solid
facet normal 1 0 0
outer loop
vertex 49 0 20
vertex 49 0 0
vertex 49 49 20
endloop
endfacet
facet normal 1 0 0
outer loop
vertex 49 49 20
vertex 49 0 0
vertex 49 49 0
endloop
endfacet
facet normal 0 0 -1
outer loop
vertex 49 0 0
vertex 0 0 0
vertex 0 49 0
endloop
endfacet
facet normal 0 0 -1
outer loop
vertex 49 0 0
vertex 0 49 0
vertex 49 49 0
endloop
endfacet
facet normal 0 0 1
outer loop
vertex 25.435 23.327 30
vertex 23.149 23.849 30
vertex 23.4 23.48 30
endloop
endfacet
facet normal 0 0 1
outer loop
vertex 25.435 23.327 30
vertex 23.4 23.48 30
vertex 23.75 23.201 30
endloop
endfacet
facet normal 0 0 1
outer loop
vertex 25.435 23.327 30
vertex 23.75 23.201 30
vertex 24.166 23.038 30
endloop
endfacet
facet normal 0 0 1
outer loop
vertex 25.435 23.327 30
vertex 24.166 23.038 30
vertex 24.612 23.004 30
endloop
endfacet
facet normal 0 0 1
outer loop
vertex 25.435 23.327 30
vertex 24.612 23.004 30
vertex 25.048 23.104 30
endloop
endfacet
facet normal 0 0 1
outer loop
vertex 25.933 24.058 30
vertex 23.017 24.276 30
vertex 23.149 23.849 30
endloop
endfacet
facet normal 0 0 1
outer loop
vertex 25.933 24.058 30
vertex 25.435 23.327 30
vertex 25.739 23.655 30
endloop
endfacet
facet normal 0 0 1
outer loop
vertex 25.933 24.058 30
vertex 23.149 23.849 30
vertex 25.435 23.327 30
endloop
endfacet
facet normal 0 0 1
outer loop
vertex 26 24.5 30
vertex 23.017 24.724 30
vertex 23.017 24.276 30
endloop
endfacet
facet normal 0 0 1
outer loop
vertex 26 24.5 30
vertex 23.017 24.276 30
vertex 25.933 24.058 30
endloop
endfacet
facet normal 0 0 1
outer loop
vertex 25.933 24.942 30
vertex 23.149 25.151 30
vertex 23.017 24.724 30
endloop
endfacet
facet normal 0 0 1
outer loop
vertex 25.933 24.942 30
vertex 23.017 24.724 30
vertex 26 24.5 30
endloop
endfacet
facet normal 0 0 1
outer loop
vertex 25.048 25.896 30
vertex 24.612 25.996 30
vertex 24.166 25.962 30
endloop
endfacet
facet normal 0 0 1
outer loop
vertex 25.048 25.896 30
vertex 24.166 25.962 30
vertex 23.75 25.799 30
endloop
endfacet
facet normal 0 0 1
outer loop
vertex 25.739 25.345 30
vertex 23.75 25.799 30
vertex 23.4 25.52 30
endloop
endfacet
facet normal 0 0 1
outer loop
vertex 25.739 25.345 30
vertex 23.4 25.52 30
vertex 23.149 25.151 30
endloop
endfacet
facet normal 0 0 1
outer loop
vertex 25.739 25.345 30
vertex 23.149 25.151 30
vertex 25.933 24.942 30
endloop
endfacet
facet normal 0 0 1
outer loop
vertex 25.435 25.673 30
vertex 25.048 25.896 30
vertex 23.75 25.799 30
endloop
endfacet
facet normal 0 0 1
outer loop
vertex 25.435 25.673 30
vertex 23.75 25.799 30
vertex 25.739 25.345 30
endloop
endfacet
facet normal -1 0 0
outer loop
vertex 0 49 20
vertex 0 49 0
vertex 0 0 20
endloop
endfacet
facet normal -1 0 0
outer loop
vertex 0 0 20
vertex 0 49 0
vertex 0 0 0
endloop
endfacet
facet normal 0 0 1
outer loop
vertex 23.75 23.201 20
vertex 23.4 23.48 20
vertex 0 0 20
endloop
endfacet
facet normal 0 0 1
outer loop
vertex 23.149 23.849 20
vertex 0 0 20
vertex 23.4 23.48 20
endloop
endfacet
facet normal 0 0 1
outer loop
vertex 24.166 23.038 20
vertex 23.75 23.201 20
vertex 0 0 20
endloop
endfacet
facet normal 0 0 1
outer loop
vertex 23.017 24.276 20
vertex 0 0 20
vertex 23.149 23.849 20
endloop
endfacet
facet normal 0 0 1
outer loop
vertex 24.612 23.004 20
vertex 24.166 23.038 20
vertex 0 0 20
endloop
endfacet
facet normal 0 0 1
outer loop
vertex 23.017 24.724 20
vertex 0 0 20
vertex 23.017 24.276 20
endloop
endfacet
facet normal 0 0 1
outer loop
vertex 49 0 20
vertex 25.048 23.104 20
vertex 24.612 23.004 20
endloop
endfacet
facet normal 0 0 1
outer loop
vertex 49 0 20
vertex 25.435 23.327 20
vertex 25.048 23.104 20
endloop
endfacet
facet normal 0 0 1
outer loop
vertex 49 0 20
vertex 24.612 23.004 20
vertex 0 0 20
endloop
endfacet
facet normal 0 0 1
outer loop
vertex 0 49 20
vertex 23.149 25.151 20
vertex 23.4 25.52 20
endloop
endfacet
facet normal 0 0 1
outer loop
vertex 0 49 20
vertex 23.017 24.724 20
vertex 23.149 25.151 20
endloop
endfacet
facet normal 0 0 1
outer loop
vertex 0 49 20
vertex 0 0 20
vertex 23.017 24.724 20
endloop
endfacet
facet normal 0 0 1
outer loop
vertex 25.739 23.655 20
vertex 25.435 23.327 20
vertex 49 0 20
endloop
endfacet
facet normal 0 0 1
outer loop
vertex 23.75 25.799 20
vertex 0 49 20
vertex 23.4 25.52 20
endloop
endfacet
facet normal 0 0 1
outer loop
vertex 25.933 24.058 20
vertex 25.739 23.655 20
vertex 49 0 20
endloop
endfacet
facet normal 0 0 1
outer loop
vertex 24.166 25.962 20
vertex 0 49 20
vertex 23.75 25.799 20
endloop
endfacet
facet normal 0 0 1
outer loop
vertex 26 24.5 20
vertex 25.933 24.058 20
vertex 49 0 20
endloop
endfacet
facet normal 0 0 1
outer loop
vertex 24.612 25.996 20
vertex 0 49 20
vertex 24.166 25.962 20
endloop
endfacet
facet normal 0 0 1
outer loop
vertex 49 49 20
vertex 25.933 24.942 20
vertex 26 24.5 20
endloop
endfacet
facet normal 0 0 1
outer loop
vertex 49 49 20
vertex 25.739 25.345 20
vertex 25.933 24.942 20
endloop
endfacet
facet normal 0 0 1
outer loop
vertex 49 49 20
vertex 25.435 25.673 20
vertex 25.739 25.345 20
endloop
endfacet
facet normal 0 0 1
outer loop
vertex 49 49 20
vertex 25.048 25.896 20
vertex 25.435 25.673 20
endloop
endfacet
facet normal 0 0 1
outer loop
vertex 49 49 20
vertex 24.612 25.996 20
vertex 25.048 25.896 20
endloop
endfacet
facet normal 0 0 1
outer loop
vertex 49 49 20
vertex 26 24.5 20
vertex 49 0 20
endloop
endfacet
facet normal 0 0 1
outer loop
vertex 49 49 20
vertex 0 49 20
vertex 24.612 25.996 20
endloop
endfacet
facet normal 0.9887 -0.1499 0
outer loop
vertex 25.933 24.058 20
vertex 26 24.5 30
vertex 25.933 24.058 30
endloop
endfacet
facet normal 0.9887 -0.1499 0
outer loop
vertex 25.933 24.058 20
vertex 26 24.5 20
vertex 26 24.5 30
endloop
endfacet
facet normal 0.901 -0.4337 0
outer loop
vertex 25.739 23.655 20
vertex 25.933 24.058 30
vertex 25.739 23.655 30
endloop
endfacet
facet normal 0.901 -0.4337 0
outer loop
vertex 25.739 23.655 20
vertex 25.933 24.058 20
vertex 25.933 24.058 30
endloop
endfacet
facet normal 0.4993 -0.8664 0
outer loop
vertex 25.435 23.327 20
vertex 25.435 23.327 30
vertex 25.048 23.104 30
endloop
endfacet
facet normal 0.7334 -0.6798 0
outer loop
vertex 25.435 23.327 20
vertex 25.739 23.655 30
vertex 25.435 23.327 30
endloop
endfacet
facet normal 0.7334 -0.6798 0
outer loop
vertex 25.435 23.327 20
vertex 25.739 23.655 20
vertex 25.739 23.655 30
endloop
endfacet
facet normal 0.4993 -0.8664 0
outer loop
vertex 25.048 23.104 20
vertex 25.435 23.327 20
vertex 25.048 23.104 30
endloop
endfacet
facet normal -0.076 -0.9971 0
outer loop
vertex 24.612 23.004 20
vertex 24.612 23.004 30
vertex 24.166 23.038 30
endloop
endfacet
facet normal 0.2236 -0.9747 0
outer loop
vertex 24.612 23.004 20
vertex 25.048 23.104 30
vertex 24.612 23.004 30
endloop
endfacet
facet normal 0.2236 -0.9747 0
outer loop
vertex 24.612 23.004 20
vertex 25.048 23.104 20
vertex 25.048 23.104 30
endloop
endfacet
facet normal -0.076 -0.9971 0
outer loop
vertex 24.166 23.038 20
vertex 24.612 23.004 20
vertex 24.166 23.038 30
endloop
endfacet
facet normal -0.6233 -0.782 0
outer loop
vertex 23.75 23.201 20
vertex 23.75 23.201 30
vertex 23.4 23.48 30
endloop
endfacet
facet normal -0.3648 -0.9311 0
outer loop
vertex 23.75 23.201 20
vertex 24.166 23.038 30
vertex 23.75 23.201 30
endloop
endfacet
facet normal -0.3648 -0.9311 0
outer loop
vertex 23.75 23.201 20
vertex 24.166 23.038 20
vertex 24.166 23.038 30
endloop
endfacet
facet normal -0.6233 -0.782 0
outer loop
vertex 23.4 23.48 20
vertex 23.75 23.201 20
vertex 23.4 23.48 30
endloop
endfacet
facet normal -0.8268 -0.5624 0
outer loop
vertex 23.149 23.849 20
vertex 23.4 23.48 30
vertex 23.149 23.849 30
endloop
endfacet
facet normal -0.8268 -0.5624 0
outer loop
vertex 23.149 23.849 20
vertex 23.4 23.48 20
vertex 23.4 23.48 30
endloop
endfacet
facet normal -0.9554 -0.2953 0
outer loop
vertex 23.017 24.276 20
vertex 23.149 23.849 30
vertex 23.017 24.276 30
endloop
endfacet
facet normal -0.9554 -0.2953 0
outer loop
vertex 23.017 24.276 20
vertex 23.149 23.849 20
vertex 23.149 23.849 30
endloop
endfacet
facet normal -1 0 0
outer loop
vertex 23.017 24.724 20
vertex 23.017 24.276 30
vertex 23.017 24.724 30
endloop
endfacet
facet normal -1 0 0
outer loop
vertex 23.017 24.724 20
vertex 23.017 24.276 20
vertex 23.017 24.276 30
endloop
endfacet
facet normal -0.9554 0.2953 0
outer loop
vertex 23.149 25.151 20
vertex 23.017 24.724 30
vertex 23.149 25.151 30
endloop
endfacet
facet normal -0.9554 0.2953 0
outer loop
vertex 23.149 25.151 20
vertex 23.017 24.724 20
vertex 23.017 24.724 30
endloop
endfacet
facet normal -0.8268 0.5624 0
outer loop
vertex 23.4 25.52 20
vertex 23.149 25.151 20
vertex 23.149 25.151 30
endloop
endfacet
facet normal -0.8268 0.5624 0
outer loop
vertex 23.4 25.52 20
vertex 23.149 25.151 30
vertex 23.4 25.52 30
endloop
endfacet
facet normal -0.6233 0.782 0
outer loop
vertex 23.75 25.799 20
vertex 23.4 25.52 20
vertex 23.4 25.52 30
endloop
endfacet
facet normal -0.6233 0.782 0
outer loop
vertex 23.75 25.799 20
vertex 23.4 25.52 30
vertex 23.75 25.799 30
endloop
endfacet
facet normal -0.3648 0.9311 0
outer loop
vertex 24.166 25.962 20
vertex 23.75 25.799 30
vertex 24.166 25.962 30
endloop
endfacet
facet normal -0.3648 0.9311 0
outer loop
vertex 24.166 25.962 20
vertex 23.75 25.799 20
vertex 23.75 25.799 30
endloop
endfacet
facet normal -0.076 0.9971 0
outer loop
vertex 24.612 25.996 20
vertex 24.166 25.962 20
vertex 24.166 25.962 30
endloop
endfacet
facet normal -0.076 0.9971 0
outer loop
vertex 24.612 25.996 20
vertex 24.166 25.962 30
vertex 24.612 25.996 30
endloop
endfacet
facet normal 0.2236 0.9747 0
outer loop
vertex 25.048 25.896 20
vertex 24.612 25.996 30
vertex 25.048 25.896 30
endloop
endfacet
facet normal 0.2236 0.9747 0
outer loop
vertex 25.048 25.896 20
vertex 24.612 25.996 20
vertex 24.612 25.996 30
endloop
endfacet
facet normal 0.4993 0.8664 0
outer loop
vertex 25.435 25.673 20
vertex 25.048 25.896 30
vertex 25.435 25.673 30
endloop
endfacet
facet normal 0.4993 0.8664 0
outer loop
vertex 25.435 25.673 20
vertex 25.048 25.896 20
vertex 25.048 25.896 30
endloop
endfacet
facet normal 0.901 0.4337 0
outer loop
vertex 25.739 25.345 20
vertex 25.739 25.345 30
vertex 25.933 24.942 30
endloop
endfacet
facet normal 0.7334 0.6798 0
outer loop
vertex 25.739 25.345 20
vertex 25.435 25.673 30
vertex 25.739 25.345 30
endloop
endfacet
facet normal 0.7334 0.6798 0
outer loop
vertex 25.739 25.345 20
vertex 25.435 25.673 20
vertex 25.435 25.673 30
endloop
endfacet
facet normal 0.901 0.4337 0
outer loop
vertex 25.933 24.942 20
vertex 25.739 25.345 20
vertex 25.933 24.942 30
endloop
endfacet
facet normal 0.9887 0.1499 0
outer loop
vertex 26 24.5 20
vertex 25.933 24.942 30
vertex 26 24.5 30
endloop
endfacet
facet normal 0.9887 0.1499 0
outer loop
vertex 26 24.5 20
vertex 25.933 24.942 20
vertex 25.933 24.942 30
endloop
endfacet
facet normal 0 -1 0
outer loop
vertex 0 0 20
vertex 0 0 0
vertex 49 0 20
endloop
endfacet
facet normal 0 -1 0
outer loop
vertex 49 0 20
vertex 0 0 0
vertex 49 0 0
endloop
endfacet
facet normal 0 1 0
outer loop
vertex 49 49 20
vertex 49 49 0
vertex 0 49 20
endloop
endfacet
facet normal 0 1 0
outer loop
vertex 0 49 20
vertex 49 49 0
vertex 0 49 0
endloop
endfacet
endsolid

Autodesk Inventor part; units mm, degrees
ref_plane "YZ Plane" through (0, 0, 0) normal (1, 0, 0) x (0, 1, 0)
ref_plane "XZ Plane" through (0, 0, 0) normal (0, 1, 0) x (-1, 0, 0)
ref_plane "XY Plane" through (0, 0, 0) normal (0, 0, 1) x (1, 0, 0)
sketch "Sketch1" plane through (0, 0, 0) normal (0, 0, 1) x (1, 0, 0)
  line L0 (0, 0) -> (49, 0)
  line L1 (49, 0) -> (49, 49)
  line L2 (49, 49) -> (0, 49)
  line L3 (0, 49) -> (0, 0)
  dimension "d0" = 49
  dimension "d1" = 49
extrude "Extrusion1" add sketch "Sketch1" along normal blind 20
sketch "Sketch2" plane through (0, 0, 20) normal (0, 0, 1) x (1, 0, 0)
  circle A0 centre (24.5, 24.5) radius 1.5
  line L0 (49, 49) -> (0, 49) projected
  line L1 (0, 0) -> (49, 0) projected
  line L2 (49, 0) -> (49, 49) projected
  line L3 (0, 49) -> (0, 0) projected
  dimension "d4" = 3
  dimension "d5" = 49
  dimension "d6" = 49
  dimension "d7" = 24.5
  dimension "d8" = 24.5
extrude "Extrusion2" add sketch "Sketch2" along normal blind 10 contours A0
equation "\"d7\" = 0.5 * d6"
equation "\"d8\" = 0.5 * d5"
properties part number "moteur"
